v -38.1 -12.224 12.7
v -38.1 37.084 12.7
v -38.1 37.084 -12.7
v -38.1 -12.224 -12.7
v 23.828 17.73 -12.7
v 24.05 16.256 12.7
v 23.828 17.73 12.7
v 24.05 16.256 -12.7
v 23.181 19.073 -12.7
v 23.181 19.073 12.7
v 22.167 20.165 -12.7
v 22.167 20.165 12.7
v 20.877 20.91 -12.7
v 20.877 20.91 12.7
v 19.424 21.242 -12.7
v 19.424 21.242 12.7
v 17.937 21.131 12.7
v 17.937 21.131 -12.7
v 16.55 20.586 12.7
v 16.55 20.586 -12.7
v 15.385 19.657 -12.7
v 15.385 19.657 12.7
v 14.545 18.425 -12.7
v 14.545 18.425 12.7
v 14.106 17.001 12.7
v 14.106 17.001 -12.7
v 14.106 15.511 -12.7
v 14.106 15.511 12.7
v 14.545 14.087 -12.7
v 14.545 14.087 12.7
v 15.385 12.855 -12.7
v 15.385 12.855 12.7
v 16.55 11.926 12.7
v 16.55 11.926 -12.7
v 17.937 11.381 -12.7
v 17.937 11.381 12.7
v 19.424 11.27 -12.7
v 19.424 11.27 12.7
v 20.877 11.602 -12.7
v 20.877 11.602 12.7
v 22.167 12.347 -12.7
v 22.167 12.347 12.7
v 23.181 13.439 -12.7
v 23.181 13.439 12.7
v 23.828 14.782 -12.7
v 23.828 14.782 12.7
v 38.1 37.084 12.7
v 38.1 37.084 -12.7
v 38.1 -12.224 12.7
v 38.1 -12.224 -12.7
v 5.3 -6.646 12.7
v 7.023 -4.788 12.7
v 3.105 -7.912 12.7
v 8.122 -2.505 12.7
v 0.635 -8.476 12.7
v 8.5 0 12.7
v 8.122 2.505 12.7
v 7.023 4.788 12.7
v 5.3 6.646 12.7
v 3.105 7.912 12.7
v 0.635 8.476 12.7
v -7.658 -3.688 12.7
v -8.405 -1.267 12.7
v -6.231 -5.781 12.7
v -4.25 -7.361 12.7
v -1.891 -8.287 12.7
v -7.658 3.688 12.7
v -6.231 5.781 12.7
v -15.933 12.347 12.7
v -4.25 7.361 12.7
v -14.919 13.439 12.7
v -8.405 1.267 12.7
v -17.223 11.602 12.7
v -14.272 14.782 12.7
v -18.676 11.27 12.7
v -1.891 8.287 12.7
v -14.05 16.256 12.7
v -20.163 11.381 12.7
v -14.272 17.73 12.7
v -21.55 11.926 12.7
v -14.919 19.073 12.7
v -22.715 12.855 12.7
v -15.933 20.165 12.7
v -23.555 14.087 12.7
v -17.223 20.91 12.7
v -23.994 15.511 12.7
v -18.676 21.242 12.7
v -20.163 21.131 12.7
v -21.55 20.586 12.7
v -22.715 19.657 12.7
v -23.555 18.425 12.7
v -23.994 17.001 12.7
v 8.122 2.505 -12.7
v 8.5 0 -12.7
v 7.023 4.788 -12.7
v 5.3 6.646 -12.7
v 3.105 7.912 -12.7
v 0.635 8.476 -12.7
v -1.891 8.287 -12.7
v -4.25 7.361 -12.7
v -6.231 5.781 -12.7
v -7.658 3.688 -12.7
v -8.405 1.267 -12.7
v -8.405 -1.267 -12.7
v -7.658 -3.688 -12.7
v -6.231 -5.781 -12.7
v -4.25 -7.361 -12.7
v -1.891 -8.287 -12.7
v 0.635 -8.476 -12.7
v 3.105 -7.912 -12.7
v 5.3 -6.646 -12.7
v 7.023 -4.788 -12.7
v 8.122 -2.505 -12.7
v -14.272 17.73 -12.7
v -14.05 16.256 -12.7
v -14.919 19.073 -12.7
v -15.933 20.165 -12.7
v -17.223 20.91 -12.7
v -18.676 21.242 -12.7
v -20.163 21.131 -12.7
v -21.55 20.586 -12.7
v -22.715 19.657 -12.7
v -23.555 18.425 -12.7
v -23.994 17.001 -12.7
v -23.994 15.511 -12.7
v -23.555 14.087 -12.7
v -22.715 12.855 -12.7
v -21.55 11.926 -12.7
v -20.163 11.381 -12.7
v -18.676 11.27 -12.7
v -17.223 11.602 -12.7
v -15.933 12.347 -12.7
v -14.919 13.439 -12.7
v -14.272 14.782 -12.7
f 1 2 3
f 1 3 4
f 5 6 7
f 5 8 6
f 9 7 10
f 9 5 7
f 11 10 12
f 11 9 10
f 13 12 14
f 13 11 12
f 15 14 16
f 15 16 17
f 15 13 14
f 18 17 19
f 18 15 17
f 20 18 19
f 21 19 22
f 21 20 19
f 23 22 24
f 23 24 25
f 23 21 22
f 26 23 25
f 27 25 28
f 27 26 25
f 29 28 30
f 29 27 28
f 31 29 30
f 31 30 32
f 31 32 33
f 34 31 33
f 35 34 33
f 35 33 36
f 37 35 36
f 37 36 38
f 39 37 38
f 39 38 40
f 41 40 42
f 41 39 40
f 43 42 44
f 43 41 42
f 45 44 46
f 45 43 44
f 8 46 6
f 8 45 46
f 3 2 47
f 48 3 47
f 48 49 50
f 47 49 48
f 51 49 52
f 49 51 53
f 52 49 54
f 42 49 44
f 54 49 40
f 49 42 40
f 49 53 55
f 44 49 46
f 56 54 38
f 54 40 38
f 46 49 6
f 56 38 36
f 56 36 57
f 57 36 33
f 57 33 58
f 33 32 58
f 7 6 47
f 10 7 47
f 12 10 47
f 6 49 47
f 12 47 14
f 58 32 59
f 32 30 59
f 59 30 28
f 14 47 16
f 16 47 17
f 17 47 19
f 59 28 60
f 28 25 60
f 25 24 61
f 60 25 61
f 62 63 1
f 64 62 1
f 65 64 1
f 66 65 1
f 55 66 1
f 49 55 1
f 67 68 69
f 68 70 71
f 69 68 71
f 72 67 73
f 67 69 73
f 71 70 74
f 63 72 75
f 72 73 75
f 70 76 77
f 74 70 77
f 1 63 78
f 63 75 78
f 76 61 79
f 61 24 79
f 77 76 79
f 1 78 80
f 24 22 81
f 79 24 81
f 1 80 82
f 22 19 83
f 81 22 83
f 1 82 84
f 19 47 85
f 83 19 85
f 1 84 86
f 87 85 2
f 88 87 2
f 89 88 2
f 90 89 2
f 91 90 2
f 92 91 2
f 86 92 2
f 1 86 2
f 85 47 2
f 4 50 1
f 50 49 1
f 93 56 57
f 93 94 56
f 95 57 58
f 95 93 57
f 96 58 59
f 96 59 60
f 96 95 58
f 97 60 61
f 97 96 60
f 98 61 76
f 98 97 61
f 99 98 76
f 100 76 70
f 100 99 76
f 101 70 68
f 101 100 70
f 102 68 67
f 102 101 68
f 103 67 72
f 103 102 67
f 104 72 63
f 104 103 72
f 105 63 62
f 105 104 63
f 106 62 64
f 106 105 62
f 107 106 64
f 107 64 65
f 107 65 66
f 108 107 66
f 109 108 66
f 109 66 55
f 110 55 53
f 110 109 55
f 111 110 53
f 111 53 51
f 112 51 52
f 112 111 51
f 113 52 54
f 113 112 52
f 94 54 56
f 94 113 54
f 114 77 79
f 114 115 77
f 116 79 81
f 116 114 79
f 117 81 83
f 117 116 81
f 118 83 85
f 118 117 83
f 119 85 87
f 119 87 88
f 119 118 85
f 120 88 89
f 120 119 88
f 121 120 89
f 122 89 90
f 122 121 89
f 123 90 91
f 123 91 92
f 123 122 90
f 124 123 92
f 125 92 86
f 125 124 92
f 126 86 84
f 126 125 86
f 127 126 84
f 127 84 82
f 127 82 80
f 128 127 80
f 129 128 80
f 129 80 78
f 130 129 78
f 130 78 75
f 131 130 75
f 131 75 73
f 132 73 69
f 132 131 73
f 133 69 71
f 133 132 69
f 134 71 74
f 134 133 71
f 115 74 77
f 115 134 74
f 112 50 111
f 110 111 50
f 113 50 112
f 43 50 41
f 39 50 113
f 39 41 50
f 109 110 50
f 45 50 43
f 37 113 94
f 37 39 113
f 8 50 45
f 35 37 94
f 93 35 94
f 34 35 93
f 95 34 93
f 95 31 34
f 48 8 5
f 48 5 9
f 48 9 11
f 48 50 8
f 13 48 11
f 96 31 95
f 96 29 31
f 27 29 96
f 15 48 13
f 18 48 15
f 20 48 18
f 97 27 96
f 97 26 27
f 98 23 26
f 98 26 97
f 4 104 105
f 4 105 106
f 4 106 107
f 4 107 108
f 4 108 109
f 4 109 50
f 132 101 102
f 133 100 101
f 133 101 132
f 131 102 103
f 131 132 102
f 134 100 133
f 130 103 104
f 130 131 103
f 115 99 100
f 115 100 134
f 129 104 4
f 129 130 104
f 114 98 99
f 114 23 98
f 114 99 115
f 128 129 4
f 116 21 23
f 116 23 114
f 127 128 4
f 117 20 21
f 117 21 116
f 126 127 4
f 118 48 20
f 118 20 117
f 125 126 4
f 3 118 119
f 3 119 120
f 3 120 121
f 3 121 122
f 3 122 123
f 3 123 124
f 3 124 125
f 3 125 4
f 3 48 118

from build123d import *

# Parameters (mm, degrees)
SKETCH1_R           = 5
SKETCH1_R_2         = 8.5
BOSS_EXTRUDE2_DEPTH = 12.7


with BuildPart() as part:
    # Sketch1 → Boss-Extrude2 (new, symmetric)
    with BuildSketch(Plane.XY):
        Polygon((-38.1, 37.084), (38.1, 37.084), (38.1, 12.224), (38.1, -12.224), (-38.1, -12.224), (-38.1, 12.224), align=None)
        with Locations((-19.05, 16.256)):
            Circle(SKETCH1_R, mode=Mode.SUBTRACT)
        with Locations((19.05, 16.256)):
            Circle(SKETCH1_R, mode=Mode.SUBTRACT)
        Circle(SKETCH1_R_2, mode=Mode.SUBTRACT)
    extrude(amount=BOSS_EXTRUDE2_DEPTH, both=True)


solid = part.part
